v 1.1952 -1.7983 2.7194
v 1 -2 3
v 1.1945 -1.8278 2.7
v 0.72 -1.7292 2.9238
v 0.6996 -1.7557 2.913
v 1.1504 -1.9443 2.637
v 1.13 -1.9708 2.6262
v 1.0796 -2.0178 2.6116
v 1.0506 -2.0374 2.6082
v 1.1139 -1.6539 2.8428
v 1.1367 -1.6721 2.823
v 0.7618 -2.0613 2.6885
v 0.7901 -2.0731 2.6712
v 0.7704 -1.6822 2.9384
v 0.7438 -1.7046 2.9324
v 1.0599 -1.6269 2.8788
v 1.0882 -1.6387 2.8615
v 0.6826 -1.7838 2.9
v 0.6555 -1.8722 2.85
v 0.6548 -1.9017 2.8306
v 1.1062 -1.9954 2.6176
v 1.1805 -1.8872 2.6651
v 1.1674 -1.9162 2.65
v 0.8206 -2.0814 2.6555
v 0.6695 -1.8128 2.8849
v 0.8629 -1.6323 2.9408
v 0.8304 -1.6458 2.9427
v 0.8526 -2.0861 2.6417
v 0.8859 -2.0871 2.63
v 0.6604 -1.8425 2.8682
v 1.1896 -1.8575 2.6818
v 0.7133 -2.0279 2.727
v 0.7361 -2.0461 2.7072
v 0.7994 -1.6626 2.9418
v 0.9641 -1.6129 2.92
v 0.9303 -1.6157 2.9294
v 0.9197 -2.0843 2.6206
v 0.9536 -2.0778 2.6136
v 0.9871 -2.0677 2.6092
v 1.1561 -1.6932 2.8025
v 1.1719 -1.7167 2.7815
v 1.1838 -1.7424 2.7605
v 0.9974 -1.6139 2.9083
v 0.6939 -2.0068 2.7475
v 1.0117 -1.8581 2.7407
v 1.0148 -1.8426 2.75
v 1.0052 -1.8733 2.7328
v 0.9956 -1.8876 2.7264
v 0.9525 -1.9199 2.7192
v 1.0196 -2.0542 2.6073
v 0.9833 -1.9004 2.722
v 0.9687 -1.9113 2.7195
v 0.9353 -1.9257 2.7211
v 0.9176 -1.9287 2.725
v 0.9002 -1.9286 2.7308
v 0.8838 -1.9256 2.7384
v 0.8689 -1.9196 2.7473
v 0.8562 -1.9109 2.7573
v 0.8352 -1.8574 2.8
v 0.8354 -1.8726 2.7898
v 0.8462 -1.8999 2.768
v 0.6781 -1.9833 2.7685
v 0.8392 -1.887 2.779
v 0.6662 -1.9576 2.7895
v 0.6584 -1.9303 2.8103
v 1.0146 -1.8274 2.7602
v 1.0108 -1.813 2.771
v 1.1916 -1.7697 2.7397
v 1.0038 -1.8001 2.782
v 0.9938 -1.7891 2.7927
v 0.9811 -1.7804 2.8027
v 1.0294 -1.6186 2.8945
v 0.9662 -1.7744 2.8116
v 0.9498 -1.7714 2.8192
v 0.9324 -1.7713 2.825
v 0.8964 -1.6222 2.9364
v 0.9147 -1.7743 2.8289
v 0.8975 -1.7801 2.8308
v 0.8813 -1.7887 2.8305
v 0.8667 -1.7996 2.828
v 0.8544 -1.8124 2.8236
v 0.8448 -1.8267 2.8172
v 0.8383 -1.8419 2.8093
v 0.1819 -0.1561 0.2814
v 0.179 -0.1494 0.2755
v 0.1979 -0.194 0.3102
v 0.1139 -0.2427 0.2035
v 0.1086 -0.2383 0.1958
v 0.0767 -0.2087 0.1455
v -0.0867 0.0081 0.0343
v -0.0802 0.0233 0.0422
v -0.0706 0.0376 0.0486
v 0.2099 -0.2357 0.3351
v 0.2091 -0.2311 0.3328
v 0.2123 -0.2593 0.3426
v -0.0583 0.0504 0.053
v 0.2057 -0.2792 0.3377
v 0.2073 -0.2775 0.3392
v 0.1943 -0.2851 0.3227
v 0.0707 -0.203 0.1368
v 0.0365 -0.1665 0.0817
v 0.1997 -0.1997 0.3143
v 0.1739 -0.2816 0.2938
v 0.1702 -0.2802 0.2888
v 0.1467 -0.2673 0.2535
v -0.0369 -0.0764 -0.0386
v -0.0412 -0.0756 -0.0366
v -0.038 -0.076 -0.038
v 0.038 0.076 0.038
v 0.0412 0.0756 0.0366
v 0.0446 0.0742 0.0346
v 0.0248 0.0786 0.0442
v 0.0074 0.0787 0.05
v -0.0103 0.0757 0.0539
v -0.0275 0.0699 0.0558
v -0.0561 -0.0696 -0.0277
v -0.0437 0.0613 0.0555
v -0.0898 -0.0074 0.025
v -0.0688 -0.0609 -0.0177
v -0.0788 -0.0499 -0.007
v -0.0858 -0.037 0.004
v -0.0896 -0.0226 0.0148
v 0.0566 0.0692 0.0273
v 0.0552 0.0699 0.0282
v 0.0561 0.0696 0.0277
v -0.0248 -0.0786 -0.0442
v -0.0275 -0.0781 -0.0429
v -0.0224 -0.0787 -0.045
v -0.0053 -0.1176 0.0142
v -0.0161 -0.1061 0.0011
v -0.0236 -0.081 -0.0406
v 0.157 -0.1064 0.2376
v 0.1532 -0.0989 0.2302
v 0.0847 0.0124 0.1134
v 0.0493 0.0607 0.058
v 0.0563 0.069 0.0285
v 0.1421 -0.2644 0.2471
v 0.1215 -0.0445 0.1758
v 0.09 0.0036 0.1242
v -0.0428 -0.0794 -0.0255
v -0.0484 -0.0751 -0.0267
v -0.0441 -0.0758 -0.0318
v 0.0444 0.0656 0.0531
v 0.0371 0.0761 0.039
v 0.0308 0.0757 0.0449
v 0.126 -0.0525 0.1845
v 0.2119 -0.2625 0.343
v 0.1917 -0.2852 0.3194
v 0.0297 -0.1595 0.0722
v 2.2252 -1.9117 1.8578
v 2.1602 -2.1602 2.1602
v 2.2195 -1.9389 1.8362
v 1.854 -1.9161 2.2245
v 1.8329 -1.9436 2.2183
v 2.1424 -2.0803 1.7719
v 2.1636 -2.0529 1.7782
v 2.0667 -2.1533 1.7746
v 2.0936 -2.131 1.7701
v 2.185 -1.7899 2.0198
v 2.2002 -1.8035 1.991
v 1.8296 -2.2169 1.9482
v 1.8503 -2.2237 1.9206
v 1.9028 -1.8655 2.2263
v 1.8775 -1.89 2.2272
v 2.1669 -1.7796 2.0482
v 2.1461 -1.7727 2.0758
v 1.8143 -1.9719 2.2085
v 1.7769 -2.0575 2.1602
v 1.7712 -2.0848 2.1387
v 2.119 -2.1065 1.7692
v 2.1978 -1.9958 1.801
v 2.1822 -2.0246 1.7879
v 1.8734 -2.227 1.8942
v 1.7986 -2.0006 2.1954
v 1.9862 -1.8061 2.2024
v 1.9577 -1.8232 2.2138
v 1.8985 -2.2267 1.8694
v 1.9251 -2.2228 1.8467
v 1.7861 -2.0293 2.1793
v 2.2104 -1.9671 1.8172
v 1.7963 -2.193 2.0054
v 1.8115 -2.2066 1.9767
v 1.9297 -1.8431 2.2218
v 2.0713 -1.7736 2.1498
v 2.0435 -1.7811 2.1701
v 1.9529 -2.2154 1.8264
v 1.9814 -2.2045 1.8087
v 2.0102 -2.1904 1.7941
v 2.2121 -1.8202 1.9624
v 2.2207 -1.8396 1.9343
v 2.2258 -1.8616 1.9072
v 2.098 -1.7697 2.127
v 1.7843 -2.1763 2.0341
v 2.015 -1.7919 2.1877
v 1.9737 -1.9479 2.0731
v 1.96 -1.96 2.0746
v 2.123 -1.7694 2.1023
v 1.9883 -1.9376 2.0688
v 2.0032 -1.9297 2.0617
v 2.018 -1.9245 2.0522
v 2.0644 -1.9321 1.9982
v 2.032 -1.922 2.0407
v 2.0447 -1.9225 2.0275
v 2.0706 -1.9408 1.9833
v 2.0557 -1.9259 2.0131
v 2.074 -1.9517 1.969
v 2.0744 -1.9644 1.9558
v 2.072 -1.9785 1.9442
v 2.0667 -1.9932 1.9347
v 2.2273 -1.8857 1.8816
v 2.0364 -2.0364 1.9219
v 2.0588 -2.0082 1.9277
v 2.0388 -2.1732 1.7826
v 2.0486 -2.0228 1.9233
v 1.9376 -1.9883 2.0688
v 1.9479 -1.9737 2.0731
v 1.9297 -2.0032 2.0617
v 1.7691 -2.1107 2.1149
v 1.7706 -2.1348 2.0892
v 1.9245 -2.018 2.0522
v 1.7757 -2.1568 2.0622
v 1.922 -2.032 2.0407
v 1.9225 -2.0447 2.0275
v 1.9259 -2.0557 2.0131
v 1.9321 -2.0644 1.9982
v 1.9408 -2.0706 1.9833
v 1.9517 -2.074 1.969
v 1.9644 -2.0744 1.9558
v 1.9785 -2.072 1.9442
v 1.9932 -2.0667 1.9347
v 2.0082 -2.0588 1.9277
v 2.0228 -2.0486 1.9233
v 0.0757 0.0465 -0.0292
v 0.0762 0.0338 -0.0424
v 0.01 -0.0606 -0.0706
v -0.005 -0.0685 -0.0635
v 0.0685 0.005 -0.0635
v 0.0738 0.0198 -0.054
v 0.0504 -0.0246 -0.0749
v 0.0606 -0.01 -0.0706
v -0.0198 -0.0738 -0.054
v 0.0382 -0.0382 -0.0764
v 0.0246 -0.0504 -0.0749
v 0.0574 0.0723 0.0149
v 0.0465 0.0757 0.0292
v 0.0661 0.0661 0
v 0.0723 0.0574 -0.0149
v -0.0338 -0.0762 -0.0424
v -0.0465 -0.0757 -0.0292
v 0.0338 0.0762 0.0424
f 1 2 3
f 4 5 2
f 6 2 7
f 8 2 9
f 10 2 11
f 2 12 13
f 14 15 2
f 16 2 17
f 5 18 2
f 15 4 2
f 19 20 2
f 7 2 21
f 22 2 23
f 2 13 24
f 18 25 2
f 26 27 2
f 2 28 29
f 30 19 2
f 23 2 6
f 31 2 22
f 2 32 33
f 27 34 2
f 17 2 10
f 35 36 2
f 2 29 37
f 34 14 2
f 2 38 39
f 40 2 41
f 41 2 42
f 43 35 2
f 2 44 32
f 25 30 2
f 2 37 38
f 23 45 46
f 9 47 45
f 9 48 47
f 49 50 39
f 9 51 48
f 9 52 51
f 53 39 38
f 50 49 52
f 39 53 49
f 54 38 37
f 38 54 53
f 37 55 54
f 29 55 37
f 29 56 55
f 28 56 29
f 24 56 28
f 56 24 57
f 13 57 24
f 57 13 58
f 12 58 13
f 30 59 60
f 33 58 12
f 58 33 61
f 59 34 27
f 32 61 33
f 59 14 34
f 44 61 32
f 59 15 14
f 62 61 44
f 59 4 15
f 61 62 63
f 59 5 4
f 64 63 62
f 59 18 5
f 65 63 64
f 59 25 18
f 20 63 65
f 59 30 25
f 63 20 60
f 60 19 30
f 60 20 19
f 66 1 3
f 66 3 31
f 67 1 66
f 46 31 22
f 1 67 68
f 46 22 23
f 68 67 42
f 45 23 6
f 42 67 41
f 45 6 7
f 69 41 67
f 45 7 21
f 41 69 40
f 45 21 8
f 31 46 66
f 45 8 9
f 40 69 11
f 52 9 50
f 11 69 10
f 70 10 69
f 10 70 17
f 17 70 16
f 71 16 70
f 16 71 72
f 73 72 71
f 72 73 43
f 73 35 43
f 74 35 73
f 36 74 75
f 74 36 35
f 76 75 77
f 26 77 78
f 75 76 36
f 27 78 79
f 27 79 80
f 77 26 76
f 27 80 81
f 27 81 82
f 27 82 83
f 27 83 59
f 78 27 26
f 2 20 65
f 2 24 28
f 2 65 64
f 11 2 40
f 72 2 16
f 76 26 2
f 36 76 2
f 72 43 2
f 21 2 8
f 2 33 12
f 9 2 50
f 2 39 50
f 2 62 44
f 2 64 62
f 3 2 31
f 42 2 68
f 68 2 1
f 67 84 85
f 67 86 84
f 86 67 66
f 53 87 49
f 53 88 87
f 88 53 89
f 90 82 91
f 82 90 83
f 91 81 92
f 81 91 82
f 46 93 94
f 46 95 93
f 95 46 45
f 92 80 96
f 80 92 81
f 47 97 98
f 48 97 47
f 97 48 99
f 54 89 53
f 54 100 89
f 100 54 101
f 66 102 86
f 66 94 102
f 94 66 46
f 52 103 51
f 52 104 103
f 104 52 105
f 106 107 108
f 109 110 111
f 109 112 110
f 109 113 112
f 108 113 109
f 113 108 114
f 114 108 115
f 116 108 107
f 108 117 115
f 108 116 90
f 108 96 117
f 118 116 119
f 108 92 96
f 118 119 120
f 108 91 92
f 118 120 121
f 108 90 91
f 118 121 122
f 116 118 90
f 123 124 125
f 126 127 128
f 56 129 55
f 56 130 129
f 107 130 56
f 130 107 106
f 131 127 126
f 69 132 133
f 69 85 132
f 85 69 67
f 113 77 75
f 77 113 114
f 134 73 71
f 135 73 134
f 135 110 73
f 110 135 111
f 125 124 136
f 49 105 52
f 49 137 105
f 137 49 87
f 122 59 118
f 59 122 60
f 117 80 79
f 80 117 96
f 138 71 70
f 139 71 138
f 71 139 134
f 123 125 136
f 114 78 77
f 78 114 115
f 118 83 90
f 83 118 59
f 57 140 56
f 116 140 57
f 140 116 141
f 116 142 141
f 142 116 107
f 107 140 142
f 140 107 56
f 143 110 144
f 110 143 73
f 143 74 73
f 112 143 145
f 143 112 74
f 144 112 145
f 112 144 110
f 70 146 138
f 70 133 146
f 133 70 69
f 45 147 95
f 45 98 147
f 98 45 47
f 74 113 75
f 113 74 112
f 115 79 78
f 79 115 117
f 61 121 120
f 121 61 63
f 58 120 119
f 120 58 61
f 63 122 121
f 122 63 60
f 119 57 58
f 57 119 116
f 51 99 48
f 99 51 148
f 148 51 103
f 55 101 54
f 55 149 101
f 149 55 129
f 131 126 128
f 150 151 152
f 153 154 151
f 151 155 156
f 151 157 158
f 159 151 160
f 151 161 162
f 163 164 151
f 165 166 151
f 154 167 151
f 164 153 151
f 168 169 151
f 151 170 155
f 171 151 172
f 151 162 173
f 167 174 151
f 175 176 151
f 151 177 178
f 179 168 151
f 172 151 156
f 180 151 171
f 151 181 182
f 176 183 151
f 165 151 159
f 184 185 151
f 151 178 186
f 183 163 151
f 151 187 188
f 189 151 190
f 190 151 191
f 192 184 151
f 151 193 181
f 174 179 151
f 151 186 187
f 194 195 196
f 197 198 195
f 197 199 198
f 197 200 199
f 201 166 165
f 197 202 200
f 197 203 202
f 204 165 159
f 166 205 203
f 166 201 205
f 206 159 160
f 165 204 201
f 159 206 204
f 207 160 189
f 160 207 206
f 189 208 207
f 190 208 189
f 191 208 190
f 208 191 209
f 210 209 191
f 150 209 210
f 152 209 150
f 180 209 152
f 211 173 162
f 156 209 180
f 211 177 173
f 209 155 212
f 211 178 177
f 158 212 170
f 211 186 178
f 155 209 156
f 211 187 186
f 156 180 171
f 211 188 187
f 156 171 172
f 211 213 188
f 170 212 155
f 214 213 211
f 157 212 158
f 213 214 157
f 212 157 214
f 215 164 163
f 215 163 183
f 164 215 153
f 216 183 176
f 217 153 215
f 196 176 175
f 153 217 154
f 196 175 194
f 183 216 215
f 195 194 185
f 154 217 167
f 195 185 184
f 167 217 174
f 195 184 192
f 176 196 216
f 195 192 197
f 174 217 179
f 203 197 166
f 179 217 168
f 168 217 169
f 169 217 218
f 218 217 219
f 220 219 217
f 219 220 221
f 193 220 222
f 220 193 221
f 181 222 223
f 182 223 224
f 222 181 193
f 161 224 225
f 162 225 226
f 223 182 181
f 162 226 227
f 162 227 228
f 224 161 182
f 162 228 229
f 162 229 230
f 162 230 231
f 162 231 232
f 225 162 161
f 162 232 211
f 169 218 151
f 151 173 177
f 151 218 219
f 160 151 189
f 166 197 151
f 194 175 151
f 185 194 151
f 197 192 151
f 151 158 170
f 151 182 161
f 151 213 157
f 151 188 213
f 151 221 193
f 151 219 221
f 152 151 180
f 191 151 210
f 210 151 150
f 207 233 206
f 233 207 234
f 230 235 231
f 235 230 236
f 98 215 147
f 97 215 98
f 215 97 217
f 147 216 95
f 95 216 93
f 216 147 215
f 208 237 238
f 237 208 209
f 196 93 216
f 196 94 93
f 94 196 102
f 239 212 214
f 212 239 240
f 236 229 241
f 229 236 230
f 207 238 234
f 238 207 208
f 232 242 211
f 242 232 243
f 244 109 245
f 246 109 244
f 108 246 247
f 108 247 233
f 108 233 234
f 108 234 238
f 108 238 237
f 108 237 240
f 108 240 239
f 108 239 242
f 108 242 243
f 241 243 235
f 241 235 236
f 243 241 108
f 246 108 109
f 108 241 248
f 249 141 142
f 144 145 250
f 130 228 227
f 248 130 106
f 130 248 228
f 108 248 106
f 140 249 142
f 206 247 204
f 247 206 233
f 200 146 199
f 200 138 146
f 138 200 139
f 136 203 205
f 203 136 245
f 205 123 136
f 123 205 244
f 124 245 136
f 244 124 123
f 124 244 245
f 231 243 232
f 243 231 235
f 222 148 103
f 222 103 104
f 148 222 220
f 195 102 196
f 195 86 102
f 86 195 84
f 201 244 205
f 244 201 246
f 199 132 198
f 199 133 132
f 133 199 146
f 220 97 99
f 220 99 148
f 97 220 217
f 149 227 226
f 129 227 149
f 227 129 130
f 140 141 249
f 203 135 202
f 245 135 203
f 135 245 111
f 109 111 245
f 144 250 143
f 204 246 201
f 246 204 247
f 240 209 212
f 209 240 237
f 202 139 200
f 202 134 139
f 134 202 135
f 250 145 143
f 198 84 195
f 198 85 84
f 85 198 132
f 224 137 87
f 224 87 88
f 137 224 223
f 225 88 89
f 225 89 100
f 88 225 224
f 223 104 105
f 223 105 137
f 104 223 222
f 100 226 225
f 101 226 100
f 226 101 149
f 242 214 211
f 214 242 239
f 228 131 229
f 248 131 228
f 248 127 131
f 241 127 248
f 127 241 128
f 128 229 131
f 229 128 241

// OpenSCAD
/*
 * Configuration for fl_vector_sign() tests
 *
 * NOTE: this file is generated automatically from 'template-3d.scad', any
 * change will be lost.
 *
 * This file is part of the 'OpenSCAD Foundation Library' (OFL) project.
 *
 * Copyright © 2021, Giampiero Gabbiani <giampiero@gabbiani.org>
 *
 * SPDX-License-Identifier: GPL-3.0-or-later
 */

//**** TEST_INCLUDES ***********************************************************
include <../lib/OFL/foundation/core.scad>

//**** TAB_PARAMETERS **********************************************************
// number of segments
$fn            = 50;           // [3:100]
// When true, disables PREVIEW corrections like FL_EPS
$FL_RENDER     = false;
// Default color for printable items (i.e. artifacts)
$fl_filament   = "DodgerBlue"; // [DodgerBlue,Blue,OrangeRed,SteelBlue]
// When false polyRound() is disabled
$fl_polyround  = true;

//**** TAB_Debug ***************************************************************
/* [Debug] */

// -2⇒none, -1⇒all, [0..)⇒max depth allowed
$FL_TRACES        = -2;     // [-2:10]
DEBUG_ASSERTIONS  = false;
DEBUG_COMPONENTS  = ["none"];
DEBUG_COLOR       = false;
DEBUG_DIMENSIONS  = false;
DEBUG_LABELS      = false;
DEBUG_SYMBOLS     = false;

//**** TAB_Verbs ***************************************************************


//**** TAB_Placement ***********************************************************
/* [3D Placement] */

X_PLACE = "undef";  // [undef,-1,0,+1]
Y_PLACE = "undef";  // [undef,-1,0,+1]
Z_PLACE = "undef";  // [undef,-1,0,+1]

//**** TAB_Direction ***********************************************************
/* [Direction] */

DIR_NATIVE  = true;
// ARBITRARY direction vector
DIR_Z       = [0,0,1];  // [-1:0.1:+1]
// rotation around
DIR_R       = 0;        // [-360:360]

//**** TAB_Dimensions **********************************************************


//**** TAB_TEST ****************************************************************
/* [TEST] */
P = [1,-2,3];

/* [Hidden] */

//**** TEST_PROLOGUE ***********************************************************
$dbg_Assert     = DEBUG_ASSERTIONS;
$dbg_Dimensions = DEBUG_DIMENSIONS;
$dbg_Color      = DEBUG_COLOR;
$dbg_Components = DEBUG_COMPONENTS[0]=="none" ? undef : DEBUG_COMPONENTS;
$dbg_Labels     = DEBUG_LABELS;
$dbg_Symbols    = DEBUG_SYMBOLS;

direction       = DIR_NATIVE    ? undef : [DIR_Z,DIR_R];
octant          = fl_parm_Octant(X_PLACE,Y_PLACE,Z_PLACE);

fl_status();

// end of automatically generated code
fl_vector(P);
fl_color("red") fl_vector(norm(P)*fl_versor(fl_vector_sign(P)));
